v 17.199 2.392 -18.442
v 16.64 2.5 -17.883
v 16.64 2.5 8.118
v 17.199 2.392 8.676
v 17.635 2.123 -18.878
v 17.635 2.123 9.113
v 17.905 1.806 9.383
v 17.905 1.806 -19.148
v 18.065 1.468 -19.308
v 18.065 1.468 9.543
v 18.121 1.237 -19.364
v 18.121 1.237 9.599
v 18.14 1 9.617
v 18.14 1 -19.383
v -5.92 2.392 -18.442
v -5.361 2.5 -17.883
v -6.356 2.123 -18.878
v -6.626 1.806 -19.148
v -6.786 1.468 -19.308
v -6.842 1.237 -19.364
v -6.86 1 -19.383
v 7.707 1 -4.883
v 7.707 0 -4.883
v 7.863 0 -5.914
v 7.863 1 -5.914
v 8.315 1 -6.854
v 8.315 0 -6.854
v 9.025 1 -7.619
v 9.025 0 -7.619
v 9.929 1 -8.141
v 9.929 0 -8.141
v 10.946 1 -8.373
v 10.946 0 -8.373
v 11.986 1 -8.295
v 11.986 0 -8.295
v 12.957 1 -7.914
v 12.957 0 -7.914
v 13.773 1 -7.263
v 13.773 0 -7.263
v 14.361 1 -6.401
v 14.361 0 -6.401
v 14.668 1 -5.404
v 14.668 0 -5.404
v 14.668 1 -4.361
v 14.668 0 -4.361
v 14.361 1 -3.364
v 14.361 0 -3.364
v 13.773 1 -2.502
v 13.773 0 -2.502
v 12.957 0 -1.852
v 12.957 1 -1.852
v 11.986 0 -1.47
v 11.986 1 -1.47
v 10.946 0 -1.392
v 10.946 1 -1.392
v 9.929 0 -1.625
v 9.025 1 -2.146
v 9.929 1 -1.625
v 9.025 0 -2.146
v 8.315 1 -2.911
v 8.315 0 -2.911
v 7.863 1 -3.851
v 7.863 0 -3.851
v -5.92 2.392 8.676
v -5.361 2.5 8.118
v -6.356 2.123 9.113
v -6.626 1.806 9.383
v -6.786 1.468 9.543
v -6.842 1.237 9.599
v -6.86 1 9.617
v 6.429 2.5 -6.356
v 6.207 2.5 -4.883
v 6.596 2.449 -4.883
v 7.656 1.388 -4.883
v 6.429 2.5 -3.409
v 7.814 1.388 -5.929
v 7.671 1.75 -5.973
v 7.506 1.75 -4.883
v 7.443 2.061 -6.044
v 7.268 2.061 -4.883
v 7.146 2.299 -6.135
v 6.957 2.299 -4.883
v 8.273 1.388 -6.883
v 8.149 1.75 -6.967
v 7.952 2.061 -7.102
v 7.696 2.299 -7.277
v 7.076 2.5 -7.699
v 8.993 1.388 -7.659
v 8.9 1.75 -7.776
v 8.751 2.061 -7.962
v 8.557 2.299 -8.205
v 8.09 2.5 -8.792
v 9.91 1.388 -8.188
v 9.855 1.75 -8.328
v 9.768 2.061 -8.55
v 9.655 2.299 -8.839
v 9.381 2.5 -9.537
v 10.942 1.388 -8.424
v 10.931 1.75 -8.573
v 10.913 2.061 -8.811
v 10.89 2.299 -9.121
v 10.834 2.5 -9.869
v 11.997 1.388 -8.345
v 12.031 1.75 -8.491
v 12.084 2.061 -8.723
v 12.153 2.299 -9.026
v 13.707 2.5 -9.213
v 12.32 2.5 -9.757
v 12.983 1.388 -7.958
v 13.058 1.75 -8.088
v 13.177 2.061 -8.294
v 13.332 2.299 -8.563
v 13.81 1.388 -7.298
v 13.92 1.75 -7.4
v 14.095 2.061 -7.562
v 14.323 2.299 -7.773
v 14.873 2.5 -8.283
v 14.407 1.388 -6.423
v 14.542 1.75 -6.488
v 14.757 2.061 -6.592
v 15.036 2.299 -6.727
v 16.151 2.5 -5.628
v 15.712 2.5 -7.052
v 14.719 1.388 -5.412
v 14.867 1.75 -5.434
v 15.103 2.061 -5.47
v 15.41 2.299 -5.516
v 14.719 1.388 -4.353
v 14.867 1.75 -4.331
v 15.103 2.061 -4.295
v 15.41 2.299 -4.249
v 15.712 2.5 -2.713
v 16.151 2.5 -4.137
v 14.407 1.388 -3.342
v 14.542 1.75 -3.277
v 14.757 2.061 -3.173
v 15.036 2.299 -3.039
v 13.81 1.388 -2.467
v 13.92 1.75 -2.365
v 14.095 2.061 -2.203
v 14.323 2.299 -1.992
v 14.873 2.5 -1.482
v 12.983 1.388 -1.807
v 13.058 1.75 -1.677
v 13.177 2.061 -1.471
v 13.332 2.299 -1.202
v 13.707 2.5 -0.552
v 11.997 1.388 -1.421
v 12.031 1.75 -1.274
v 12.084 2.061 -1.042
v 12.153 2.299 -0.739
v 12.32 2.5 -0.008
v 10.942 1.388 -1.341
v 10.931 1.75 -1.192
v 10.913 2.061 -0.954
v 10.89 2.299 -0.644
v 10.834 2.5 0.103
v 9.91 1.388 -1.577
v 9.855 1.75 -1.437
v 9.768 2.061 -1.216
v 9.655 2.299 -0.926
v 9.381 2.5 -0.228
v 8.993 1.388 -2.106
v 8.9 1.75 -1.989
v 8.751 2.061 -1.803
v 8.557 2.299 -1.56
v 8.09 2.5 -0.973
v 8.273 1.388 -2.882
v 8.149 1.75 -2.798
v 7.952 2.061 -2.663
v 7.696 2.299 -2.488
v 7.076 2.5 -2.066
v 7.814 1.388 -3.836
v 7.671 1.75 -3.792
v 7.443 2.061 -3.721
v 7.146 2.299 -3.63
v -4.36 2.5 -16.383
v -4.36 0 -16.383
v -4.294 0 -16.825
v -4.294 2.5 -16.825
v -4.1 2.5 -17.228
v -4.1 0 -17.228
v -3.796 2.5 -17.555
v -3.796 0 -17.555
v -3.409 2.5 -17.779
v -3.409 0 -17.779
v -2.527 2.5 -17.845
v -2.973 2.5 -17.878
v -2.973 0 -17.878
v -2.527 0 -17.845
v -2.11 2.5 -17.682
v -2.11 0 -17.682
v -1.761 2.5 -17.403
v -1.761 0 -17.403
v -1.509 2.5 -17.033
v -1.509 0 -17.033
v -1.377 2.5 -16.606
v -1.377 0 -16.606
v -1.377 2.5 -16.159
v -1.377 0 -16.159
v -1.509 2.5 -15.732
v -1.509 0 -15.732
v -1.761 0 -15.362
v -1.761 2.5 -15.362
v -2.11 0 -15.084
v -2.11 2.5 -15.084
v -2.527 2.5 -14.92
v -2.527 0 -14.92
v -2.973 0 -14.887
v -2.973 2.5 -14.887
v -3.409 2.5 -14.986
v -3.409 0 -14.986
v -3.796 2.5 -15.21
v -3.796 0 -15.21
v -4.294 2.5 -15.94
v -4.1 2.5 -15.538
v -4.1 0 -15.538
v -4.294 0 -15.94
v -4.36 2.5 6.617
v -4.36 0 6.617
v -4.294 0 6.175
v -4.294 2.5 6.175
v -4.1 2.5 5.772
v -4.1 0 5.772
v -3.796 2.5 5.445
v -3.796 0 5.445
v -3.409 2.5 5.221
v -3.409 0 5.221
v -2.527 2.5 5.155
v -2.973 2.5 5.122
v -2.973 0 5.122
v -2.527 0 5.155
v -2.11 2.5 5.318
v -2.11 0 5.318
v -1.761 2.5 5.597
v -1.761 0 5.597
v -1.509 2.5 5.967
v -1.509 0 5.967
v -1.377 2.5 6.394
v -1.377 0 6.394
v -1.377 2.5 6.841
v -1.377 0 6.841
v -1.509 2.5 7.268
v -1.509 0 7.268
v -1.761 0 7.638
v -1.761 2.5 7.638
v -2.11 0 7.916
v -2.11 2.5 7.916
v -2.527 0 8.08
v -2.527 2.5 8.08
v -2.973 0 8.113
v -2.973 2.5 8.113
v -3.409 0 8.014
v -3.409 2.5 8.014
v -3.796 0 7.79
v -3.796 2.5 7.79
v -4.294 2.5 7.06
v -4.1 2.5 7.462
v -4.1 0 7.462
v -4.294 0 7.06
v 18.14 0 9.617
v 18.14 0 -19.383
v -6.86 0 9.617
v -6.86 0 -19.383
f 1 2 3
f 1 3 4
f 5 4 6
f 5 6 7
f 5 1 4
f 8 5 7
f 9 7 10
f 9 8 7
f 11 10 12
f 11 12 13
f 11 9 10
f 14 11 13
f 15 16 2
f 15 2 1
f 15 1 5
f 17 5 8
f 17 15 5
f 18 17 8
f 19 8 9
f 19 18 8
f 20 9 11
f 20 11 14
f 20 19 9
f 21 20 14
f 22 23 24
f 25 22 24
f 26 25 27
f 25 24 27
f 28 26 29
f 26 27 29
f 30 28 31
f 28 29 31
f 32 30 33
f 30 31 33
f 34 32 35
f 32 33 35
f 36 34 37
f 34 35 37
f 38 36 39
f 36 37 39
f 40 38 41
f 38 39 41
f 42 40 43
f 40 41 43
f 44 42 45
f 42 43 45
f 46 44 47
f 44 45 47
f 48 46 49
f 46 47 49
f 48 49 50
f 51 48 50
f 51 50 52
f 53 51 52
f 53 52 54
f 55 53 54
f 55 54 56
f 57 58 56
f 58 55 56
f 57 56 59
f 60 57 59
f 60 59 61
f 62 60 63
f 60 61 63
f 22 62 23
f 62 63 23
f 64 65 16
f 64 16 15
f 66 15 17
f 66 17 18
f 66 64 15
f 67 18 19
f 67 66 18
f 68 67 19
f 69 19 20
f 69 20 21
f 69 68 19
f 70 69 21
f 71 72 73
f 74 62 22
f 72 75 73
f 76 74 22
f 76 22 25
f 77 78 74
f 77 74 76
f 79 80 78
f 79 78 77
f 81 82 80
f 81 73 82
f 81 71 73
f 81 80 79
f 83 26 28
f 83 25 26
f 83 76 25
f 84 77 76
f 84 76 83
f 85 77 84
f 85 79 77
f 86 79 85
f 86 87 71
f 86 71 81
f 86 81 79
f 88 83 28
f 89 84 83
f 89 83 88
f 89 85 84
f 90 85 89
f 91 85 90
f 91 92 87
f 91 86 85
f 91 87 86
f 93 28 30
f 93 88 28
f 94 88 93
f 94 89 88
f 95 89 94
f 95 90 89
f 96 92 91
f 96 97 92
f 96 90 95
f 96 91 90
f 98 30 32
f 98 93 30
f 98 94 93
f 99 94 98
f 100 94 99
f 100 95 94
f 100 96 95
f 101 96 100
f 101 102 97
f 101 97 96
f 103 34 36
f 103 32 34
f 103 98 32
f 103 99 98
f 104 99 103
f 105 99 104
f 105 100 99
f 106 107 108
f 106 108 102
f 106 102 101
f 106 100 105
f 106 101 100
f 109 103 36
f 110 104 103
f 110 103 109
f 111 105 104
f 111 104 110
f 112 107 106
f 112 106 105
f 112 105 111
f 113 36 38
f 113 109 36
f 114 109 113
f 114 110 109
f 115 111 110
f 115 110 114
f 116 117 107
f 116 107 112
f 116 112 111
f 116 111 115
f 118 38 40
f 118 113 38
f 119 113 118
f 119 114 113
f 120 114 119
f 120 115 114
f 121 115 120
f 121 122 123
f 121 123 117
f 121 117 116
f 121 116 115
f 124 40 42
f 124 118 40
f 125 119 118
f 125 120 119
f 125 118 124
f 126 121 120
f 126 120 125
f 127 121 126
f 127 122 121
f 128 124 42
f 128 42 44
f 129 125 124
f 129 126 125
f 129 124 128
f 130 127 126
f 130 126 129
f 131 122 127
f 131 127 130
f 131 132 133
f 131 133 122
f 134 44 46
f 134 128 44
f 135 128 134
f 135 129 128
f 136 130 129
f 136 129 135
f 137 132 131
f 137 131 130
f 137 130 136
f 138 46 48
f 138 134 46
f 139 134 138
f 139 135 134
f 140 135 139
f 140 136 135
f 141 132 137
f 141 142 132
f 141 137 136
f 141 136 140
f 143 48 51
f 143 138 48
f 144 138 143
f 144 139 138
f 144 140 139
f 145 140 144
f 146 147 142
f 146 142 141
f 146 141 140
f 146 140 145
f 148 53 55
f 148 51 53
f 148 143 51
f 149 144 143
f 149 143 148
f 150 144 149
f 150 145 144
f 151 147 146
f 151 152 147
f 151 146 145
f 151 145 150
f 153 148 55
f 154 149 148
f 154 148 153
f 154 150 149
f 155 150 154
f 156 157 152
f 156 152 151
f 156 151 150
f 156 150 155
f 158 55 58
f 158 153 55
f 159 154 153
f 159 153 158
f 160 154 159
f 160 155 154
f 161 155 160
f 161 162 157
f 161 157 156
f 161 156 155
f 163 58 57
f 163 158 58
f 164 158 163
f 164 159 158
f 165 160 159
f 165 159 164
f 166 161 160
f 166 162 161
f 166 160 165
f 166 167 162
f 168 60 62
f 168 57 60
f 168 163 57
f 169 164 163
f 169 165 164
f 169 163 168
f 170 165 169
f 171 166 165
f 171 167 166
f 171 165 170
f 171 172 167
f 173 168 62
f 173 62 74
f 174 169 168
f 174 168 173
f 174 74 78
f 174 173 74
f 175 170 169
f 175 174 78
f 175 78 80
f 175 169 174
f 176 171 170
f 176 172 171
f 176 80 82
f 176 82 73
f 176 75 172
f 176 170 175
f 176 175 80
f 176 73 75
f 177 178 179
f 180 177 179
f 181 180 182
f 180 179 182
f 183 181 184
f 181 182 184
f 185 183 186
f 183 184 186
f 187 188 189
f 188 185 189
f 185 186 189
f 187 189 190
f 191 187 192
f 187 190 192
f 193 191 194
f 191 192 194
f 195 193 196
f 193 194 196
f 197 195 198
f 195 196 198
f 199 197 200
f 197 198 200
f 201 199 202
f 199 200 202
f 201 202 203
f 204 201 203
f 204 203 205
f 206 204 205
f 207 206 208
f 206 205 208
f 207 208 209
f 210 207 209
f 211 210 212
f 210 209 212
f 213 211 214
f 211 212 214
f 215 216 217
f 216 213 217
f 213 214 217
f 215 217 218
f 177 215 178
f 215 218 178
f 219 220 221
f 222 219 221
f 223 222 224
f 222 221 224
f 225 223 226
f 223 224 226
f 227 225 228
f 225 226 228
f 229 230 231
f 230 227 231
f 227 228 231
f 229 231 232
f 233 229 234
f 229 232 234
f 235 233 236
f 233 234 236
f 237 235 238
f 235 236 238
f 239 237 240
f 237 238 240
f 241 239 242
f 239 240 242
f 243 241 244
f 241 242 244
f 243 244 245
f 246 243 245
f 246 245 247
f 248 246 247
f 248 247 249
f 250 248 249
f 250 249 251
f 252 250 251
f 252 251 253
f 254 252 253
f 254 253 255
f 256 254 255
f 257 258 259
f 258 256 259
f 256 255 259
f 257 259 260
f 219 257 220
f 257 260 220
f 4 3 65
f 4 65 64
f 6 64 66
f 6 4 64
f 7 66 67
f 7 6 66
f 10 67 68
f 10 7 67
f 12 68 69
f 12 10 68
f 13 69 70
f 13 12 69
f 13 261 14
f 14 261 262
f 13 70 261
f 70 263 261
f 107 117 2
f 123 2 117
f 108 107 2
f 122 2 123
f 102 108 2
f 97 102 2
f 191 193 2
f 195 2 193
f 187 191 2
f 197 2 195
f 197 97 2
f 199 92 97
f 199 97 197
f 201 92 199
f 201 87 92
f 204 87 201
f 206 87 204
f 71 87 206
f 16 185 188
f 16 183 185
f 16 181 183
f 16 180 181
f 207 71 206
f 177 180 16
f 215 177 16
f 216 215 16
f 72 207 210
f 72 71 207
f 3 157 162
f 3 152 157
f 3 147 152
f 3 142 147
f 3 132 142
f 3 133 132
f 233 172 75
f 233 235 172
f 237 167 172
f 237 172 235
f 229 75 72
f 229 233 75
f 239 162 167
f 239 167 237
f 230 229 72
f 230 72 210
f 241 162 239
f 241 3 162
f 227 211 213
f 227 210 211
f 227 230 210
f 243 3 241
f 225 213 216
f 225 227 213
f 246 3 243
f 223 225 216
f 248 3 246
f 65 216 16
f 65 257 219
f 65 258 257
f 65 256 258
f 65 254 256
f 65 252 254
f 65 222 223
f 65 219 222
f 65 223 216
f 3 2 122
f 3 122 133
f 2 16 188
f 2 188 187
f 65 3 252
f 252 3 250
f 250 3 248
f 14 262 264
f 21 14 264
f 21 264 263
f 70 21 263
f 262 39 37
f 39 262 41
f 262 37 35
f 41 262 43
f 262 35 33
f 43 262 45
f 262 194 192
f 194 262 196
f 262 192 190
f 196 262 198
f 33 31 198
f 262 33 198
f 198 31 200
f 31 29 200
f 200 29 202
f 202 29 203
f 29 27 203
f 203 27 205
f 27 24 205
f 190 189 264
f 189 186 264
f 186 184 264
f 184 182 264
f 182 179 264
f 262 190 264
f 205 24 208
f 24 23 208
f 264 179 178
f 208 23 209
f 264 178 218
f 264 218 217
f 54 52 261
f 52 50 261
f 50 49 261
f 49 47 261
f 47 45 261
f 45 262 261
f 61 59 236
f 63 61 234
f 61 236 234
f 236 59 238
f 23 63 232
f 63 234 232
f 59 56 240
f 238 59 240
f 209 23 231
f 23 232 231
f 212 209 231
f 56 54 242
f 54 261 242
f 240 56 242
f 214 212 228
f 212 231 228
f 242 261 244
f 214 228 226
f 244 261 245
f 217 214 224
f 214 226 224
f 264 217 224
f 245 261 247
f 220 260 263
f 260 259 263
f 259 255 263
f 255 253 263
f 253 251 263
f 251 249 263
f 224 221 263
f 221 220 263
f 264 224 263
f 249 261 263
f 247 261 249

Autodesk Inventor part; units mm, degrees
ref_plane "YZ Plane" through (0, 0, 0) normal (1, 0, 0) x (0, 1, 0)
ref_plane "XZ Plane" through (0, 0, 0) normal (0, 1, 0) x (-1, 0, 0)
ref_plane "XY Plane" through (0, 0, 0) normal (0, 0, 1) x (1, 0, 0)
sketch "Эскиз1" plane through (0, 0, 0) normal (0, 1, 0) x (-1, 0, 0)
  line L0 (6.8605, 9.6174) -> (-18.1395, 9.6174)
  line L1 (-18.1395, 9.6174) -> (-18.1395, -19.3826)
  line L2 (-18.1395, -19.3826) -> (6.8605, -19.3826)
  line L3 (6.8605, -19.3826) -> (6.8605, 9.6174)
  circle A0 centre (2.8605, 6.6174) radius 1.5
  circle A1 centre (2.8605, -16.3826) radius 1.5
  circle A2 centre (-11.2073, -4.8826) radius 3.5
  point P0 (0, 0)
  dimension "d0" = 3
  dimension "d1" = 3
  dimension "d2" = 23
  dimension "d3" = 3
  dimension "d4" = 3
  dimension "d5" = 25
  dimension "d6" = 4
  dimension "d7" = 7
extrude "Выдавливание1" add sketch "Эскиз1" along normal blind 2.5
fillet "Сопряжение1" radius 1.5 1 edges at (14.7073, 2.5, -4.8826)
fillet "Сопряжение2" radius 1.5 4 edges at (5.6395, 2.5, 9.6174) (18.1395, 2.5, -4.8826) (5.6395, 2.5, -19.3826) (-6.8605, 2.5, -4.8826)
